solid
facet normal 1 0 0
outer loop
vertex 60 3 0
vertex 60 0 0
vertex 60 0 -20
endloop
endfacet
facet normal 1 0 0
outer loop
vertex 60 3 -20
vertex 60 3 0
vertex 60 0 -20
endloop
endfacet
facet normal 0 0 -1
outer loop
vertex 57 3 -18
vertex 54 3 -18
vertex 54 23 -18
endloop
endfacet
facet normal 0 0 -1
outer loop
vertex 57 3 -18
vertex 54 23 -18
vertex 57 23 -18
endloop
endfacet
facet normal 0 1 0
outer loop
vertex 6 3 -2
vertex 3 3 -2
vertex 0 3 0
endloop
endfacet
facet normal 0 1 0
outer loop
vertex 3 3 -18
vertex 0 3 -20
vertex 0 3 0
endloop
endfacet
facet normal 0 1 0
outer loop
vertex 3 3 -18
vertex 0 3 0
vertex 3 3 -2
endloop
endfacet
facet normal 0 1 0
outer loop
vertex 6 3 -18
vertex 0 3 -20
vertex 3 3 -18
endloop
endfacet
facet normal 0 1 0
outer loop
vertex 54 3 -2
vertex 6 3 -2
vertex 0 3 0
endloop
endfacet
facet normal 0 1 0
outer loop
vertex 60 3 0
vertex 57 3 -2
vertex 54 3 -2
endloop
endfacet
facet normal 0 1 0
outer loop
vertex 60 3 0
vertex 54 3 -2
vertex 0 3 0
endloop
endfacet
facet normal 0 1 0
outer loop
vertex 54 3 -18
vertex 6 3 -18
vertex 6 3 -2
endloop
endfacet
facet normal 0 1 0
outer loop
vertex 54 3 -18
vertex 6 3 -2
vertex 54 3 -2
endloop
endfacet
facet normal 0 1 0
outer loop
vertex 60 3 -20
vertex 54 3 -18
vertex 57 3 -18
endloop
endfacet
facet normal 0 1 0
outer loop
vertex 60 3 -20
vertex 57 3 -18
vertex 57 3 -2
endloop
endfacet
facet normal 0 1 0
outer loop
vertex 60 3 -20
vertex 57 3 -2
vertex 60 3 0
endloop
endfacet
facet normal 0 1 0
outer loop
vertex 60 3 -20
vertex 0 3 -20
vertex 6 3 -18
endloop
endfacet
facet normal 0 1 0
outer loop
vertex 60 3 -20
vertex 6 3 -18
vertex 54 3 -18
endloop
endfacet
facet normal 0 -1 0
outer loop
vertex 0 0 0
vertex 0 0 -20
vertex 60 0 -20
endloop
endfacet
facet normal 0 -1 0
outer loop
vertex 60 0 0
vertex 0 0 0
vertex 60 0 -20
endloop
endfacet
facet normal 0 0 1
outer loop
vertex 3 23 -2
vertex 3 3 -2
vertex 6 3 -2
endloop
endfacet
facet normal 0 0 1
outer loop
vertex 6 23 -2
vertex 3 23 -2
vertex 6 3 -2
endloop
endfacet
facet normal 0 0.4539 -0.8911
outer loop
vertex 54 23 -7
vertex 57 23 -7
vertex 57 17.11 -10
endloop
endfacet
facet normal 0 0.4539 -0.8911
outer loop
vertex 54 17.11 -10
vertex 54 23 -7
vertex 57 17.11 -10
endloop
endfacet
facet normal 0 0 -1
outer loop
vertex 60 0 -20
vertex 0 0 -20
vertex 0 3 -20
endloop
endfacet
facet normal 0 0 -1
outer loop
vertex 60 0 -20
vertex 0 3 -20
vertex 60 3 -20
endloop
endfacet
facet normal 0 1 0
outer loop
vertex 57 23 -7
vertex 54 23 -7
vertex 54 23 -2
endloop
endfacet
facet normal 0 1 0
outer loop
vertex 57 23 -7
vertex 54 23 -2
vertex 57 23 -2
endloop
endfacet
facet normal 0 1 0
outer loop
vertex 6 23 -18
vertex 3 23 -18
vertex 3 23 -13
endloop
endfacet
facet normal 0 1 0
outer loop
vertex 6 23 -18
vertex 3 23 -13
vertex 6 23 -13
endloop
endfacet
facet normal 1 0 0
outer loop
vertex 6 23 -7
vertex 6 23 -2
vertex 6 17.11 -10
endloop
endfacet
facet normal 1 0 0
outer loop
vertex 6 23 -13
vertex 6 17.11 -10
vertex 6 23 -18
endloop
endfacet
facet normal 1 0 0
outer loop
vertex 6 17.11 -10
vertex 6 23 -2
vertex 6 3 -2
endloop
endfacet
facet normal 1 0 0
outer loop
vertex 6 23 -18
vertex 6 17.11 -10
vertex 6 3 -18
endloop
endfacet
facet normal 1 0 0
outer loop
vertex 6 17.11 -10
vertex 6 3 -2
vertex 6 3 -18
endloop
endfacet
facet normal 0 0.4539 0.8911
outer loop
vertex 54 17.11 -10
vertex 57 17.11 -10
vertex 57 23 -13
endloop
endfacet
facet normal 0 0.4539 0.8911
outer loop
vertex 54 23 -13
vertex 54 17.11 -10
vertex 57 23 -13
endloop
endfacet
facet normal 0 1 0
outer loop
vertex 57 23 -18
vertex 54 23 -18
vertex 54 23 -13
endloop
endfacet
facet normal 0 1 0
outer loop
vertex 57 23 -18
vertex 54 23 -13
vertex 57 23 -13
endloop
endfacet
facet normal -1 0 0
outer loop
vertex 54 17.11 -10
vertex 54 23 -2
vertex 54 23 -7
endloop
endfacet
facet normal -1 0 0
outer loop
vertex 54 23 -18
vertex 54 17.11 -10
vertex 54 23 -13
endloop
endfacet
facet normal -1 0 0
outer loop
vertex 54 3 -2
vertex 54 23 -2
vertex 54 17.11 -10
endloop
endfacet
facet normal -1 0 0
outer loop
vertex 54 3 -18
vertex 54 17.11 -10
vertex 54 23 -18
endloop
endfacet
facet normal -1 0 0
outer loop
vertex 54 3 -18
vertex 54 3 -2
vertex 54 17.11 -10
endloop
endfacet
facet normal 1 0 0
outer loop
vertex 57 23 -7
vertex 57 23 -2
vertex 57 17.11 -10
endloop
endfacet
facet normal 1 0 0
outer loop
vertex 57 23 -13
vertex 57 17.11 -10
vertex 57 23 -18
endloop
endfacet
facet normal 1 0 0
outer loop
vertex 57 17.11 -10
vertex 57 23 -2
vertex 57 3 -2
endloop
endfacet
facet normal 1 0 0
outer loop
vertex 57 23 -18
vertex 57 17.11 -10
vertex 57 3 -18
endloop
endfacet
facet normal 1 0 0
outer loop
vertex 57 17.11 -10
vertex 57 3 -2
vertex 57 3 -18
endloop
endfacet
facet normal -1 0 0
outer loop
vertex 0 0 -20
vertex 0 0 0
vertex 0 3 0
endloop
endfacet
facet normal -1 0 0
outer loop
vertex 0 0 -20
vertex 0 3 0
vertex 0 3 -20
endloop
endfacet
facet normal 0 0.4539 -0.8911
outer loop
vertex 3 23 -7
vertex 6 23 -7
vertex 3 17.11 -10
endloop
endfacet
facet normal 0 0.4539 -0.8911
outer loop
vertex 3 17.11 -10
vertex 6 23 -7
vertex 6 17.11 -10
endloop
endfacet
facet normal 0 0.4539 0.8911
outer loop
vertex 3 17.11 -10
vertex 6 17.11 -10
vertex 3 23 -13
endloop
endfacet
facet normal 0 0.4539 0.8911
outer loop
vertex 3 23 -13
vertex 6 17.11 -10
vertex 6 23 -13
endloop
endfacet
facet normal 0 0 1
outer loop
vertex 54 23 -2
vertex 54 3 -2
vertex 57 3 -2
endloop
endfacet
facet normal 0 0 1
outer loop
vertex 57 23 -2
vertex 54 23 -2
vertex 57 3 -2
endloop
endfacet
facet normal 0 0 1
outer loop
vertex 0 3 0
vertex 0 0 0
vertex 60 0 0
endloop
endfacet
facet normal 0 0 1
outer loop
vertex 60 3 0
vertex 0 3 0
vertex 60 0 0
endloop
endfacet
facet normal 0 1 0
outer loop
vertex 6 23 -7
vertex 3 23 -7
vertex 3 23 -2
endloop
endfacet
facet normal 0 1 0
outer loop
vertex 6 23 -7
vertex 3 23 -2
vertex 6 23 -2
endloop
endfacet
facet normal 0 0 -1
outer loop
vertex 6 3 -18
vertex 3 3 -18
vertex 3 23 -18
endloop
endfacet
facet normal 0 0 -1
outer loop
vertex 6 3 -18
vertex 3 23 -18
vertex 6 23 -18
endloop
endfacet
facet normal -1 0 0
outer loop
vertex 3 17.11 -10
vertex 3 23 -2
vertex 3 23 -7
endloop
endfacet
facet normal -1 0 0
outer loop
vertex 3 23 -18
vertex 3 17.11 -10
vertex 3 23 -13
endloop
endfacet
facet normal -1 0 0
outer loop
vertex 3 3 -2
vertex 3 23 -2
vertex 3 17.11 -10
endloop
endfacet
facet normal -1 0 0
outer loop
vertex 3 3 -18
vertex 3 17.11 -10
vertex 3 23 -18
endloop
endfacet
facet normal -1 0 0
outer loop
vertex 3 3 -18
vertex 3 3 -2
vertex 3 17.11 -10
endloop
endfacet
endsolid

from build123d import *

# Parameters (mm, degrees)
SKETCH_1_W               = 60
SKETCH_1_H               = 20
EXTRUDE_320_DEPTH        = 3
SKETCH_3_W               = 3
SKETCH_3_H               = 16
EXTRUDE_3_DEPTH          = 20
CUT_EXTRUDE_4_DEPTH      = 4
CUT_EXTRUDE_4_DEPTH_BACK = 58


with BuildPart() as part:
    # Эскиз1 → Extrude 320 (new body)
    with BuildSketch(Plane(origin=(0, 0, 0), x_dir=(1, 0, 0), z_dir=(0, 1, 0))):
        with Locations((30, 10)):
            Rectangle(SKETCH_1_W, SKETCH_1_H)
    extrude(amount=EXTRUDE_320_DEPTH)

    # Эскиз3 → Бобышка-Вытянуть3 (add)
    with BuildSketch(Plane(origin=(0, 3, 0), x_dir=(1, 0, 0), z_dir=(0, 1, 0))):
        with Locations((4.5, 10)):
            Rectangle(SKETCH_3_W, SKETCH_3_H)
        with Locations((55.5, 10)):
            Rectangle(SKETCH_3_W, SKETCH_3_H)
    extrude(amount=EXTRUDE_3_DEPTH)

    # Эскиз13 → Вырез-Вытянуть4 (cut, two sides)
    with BuildSketch(Plane(origin=(57, 0, 0), x_dir=(0, 0, -1), z_dir=(1, 0, 0))) as cut_extrude_4_sk:
        Polygon((7, 23), (10, 17.110151736), (13, 23), align=None)
    extrude(amount=CUT_EXTRUDE_4_DEPTH, mode=Mode.SUBTRACT)
    extrude(cut_extrude_4_sk.sketch, amount=-CUT_EXTRUDE_4_DEPTH_BACK, mode=Mode.SUBTRACT)


solid = part.part
